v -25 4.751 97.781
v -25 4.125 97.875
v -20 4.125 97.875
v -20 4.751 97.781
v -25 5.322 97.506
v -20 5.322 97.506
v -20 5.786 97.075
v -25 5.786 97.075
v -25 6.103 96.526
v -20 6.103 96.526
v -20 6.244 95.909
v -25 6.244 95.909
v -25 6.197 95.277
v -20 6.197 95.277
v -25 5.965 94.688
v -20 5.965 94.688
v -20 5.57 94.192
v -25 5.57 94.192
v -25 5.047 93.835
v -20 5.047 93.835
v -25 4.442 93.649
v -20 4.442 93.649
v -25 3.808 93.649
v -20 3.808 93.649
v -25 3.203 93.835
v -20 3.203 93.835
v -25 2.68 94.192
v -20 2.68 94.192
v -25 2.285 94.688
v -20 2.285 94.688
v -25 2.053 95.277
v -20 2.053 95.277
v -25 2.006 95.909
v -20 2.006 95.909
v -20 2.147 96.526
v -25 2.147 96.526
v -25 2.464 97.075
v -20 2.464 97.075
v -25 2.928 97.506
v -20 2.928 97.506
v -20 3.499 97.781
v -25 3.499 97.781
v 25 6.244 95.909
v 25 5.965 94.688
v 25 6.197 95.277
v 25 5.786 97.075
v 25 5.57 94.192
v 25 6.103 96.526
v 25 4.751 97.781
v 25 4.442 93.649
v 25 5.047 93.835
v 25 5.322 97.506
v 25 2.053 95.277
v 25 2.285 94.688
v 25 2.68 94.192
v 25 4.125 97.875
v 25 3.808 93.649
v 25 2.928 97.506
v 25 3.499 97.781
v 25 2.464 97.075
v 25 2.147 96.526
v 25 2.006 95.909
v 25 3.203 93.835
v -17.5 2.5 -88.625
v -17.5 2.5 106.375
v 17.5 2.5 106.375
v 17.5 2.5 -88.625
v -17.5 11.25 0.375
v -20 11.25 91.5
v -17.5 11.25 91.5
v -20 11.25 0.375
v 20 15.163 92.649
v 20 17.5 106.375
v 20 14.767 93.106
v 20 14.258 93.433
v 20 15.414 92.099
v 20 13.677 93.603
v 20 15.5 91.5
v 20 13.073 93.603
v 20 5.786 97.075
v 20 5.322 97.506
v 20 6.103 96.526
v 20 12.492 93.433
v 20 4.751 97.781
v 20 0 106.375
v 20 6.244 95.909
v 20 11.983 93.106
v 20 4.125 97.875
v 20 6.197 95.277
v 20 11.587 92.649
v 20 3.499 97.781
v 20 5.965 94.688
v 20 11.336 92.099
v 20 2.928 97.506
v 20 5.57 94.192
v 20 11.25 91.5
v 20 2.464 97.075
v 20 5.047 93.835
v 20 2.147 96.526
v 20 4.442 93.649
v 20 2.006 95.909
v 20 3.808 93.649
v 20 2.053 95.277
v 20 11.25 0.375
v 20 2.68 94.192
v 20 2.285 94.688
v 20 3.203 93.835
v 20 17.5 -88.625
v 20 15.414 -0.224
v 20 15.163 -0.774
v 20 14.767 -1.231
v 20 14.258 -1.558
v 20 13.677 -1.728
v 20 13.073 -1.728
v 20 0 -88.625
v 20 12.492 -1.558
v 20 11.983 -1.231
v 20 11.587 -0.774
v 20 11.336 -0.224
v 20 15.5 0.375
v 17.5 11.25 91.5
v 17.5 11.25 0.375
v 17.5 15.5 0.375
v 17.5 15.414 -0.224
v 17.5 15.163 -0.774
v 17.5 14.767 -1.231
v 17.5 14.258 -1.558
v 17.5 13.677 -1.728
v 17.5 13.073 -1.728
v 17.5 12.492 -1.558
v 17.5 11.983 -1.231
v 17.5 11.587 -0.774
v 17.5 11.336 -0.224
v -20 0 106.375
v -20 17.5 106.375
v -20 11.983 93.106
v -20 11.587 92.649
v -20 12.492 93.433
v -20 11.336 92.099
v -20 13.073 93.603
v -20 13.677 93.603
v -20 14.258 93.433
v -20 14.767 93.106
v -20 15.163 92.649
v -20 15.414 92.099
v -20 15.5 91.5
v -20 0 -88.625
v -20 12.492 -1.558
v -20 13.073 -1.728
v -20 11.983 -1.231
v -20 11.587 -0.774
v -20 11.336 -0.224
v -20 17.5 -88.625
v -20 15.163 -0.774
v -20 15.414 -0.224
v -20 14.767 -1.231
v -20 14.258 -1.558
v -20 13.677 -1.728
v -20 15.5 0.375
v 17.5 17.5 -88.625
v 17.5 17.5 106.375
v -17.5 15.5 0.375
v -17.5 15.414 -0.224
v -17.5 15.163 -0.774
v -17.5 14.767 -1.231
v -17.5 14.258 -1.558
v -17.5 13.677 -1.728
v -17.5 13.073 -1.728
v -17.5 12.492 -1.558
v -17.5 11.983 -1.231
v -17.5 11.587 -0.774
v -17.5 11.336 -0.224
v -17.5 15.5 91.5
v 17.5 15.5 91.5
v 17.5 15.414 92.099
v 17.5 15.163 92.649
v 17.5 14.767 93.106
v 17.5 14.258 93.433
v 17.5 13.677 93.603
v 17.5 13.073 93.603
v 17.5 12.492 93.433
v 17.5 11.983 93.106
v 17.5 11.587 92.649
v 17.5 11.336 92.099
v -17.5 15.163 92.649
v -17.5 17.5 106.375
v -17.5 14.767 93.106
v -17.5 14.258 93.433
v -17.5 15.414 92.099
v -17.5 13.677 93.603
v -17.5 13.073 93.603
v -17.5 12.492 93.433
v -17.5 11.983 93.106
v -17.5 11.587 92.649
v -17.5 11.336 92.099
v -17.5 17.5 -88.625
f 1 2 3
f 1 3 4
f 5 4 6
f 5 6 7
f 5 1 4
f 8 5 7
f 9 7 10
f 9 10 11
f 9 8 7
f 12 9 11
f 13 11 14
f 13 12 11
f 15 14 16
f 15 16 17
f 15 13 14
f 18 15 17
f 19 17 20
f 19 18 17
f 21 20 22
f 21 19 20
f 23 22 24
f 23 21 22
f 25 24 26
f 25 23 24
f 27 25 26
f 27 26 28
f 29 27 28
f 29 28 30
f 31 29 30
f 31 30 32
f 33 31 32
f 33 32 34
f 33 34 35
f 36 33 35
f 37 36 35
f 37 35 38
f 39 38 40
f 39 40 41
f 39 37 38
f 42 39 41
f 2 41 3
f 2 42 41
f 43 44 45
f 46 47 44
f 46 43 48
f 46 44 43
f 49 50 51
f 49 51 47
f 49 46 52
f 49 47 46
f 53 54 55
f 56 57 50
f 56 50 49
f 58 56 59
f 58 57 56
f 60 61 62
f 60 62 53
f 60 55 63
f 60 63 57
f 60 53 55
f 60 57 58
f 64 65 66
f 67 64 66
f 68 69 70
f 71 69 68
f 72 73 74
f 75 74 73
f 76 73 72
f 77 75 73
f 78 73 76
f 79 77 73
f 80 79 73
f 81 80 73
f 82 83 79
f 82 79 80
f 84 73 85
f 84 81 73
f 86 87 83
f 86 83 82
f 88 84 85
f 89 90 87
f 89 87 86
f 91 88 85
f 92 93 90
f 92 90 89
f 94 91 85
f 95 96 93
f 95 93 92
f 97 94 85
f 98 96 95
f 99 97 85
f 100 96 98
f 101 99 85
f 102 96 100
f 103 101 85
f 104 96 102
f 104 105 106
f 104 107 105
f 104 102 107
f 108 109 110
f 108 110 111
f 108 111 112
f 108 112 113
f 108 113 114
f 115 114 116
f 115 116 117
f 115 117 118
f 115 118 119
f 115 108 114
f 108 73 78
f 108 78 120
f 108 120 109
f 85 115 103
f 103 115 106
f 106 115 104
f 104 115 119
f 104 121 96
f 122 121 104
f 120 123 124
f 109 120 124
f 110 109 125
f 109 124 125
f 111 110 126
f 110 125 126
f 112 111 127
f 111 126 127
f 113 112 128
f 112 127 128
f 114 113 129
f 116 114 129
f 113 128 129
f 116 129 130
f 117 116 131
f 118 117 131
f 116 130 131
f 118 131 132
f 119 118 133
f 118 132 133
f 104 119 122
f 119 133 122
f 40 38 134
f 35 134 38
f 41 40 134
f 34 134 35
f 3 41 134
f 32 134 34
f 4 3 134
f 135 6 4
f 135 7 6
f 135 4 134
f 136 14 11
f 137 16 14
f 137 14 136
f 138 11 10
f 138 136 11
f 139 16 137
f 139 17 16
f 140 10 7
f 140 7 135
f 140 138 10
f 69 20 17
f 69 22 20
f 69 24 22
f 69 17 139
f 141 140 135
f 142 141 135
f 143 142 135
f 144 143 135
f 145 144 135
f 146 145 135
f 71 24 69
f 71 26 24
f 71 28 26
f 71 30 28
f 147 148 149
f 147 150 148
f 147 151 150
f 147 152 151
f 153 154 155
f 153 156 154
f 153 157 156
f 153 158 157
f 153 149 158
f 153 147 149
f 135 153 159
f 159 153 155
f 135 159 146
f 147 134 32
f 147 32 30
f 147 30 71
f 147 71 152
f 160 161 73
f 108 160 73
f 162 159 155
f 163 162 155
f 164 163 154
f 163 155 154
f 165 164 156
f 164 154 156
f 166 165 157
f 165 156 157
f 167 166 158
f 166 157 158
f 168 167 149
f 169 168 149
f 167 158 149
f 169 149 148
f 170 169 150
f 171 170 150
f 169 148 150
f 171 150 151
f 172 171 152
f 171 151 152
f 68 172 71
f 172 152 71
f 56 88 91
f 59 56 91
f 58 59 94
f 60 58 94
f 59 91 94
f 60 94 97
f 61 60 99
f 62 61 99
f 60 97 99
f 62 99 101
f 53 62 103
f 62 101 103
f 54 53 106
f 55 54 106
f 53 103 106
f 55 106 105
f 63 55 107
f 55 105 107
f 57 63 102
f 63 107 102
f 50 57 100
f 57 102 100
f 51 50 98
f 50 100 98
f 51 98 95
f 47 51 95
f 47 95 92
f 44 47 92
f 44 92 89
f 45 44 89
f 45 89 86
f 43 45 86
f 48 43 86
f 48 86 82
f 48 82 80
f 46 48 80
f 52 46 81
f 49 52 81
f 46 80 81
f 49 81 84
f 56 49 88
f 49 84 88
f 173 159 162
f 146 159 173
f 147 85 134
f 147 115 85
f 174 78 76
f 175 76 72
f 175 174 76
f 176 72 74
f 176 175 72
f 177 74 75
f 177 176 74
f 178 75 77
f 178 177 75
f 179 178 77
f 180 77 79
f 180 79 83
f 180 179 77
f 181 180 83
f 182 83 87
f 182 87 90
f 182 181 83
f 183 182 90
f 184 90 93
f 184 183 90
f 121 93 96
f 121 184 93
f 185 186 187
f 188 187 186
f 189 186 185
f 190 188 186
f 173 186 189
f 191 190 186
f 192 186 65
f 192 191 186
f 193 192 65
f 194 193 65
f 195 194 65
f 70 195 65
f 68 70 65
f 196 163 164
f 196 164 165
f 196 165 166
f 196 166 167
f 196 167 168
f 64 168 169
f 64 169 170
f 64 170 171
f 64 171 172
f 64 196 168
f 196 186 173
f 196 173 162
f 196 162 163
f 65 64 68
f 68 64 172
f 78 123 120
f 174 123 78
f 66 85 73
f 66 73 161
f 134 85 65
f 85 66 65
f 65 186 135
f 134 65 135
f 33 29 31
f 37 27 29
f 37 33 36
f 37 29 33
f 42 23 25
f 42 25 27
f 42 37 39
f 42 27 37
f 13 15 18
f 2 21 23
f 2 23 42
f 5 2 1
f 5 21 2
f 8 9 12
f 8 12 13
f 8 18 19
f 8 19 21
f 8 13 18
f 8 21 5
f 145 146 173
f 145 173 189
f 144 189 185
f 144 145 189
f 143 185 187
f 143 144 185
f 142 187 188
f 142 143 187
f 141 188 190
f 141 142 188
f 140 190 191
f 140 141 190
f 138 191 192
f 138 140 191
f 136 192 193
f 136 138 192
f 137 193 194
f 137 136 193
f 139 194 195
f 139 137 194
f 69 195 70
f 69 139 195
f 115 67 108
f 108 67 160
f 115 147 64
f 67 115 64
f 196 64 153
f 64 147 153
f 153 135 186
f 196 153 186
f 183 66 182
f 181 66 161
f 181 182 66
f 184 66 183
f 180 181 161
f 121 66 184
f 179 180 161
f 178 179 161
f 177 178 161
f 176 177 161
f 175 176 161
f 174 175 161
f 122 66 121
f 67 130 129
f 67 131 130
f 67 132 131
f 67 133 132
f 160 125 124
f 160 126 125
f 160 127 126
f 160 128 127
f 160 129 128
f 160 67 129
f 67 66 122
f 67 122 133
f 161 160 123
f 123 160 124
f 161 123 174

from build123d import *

# Parameters (mm, degrees)
SKETCH1_W           = 40
SKETCH1_H           = 200
BOSS_EXTRUDE1_DEPTH = 20
SKETCH2_R           = 2.125
BOSS_EXTRUDE2_DEPTH = 5
BOSS_EXTRUDE3_START = 5
SKETCH3_R           = 2.125
BOSS_EXTRUDE3_DEPTH = 5
SKETCH4_W           = 35
SKETCH4_H           = 35
CUT_EXTRUDE1_DEPTH  = 210.5
CUT_EXTRUDE2_DEPTH  = 210.5
CUT_EXTRUDE3_DEPTH  = 210.5
BOSS_EXTRUDE4_DEPTH = 40
SKETCH8_W           = 35
SKETCH8_H           = 4.25
CUT_EXTRUDE4_DEPTH  = 141
CUT_EXTRUDE5_DEPTH  = 50
BOSS_EXTRUDE5_DEPTH = 40
SKETCH16_W          = 35
SKETCH16_H          = 4.25
CUT_EXTRUDE6_DEPTH  = 40
SKETCH17_W          = 6.375
SKETCH17_H          = 17.5
CUT_EXTRUDE7_DEPTH  = 53
BOSS_EXTRUDE6_DEPTH = 6.375


with BuildPart() as part:
    # Sketch1 → Boss-Extrude1 (new body)
    with BuildSketch(Plane(origin=(0, 0, 0), x_dir=(1, 0, 0), z_dir=(0, 1, 0))):
        Rectangle(SKETCH1_W, SKETCH1_H)
    extrude(amount=BOSS_EXTRUDE1_DEPTH)

    # Sketch2 → Boss-Extrude2 (add)
    with BuildSketch(Plane(origin=(20, 0, 0), x_dir=(0, 0, -1), z_dir=(1, 0, 0))):
        with Locations(Location((-95.75, 4.125, 0), (0, 0, 180))):
            Circle(SKETCH2_R)
    extrude(amount=BOSS_EXTRUDE2_DEPTH)

    # Sketch3 → Boss-Extrude3 (add)
    with BuildSketch(Plane.ZY.offset(20).offset(BOSS_EXTRUDE3_START)):
        with Locations((95.75, 4.125)):
            Circle(SKETCH3_R)
    extrude(amount=-BOSS_EXTRUDE3_DEPTH)

    # Sketch4 → Cut-Extrude1 (cut)
    with BuildSketch(Plane.XY.offset(100)):
        with Locations((0, 20)):
            Rectangle(SKETCH4_W, SKETCH4_H)
    extrude(amount=-CUT_EXTRUDE1_DEPTH, mode=Mode.SUBTRACT)

    # Sketch5 → Cut-Extrude2 (cut)
    with BuildSketch(Plane.ZY.offset(20)):
        Polygon((-100, 0), (-95, 0), (-95, 17.5), (100, 17.5), (100, 20), (-100, 20), align=None)
    extrude(amount=-CUT_EXTRUDE2_DEPTH, mode=Mode.SUBTRACT)

    # Sketch6 → Cut-Extrude3 (cut)
    with BuildSketch(Plane.ZY.offset(20)):
        with BuildLine():
            Line((-90.75, 15.5), (95.75, 15.5))
            ThreePointArc((95.75, 15.5), (97.875, 13.375), (95.75, 11.25))
            Line((95.75, 11.25), (-90.75, 11.25))
            ThreePointArc((-90.75, 11.25), (-92.875, 13.375), (-90.75, 15.5))
        make_face()
    extrude(amount=-CUT_EXTRUDE3_DEPTH, mode=Mode.SUBTRACT)

    # Sketch7 → Boss-Extrude4 (add)
    with BuildSketch(Plane.ZY.offset(20)):
        with BuildLine():
            Line((6.75, 11.25), (-95, 11.25))
            Line((-95, 11.25), (-95, 15.5))
            Line((-95, 15.5), (6.75, 15.5))
            ThreePointArc((6.75, 15.5), (4.625, 13.375), (6.75, 11.25))
        make_face()
    extrude(amount=-BOSS_EXTRUDE4_DEPTH)

    # Sketch8 → Cut-Extrude4 (cut)
    with BuildSketch(Plane(origin=(0, 0, -95), x_dir=(-1, 0, 0), z_dir=(0, 0, -1))):
        with Locations((0, 13.375)):
            Rectangle(SKETCH8_W, SKETCH8_H)
    extrude(amount=-CUT_EXTRUDE4_DEPTH, mode=Mode.SUBTRACT)

    # Sketch14 → Cut-Extrude5 (cut)
    with BuildSketch(Plane.ZY.offset(20)):
        with BuildLine():
            Line((0.375, 11.25), (6.75, 11.25))
            Line((6.75, 11.25), (6.75, 15.5))
            Line((6.75, 15.5), (0.375, 15.5))
            ThreePointArc((0.375, 15.5), (-1.75, 13.375), (0.375, 11.25))
        make_face()
    extrude(amount=-CUT_EXTRUDE5_DEPTH, mode=Mode.SUBTRACT)

    # Sketch15 → Boss-Extrude5 (add)
    with BuildSketch(Plane.ZY.offset(20)):
        with BuildLine():
            Line((95.75, 15.5), (91.5, 15.5))
            ThreePointArc((91.5, 15.5), (93.625, 13.375), (91.5, 11.25))
            Line((91.5, 11.25), (95.75, 11.25))
            ThreePointArc((95.75, 11.25), (97.875, 13.375), (95.75, 15.5))
        make_face()
    extrude(amount=-BOSS_EXTRUDE5_DEPTH)

    # Sketch16 → Cut-Extrude6 (cut)
    with BuildSketch(Plane.XY.offset(100)):
        with Locations((0, 13.375)):
            Rectangle(SKETCH16_W, SKETCH16_H)
    extrude(amount=-CUT_EXTRUDE6_DEPTH, mode=Mode.SUBTRACT)

    # Sketch17 → Cut-Extrude7 (cut)
    with BuildSketch(Plane.ZY.offset(20)):
        with Locations((-91.8125, 8.75)):
            Rectangle(SKETCH17_W, SKETCH17_H)
    extrude(amount=-CUT_EXTRUDE7_DEPTH, mode=Mode.SUBTRACT)

    # Sketch18 → Boss-Extrude6 (add)
    with BuildSketch(Plane.XY.offset(100)):
        Polygon((-20, 17.5), (-17.5, 17.5), (-17.5, 2.5), (17.5, 2.5), (17.5, 17.5), (20, 17.5), (20, 0), (-20, 0), align=None)
    extrude(amount=BOSS_EXTRUDE6_DEPTH)


solid = part.part
